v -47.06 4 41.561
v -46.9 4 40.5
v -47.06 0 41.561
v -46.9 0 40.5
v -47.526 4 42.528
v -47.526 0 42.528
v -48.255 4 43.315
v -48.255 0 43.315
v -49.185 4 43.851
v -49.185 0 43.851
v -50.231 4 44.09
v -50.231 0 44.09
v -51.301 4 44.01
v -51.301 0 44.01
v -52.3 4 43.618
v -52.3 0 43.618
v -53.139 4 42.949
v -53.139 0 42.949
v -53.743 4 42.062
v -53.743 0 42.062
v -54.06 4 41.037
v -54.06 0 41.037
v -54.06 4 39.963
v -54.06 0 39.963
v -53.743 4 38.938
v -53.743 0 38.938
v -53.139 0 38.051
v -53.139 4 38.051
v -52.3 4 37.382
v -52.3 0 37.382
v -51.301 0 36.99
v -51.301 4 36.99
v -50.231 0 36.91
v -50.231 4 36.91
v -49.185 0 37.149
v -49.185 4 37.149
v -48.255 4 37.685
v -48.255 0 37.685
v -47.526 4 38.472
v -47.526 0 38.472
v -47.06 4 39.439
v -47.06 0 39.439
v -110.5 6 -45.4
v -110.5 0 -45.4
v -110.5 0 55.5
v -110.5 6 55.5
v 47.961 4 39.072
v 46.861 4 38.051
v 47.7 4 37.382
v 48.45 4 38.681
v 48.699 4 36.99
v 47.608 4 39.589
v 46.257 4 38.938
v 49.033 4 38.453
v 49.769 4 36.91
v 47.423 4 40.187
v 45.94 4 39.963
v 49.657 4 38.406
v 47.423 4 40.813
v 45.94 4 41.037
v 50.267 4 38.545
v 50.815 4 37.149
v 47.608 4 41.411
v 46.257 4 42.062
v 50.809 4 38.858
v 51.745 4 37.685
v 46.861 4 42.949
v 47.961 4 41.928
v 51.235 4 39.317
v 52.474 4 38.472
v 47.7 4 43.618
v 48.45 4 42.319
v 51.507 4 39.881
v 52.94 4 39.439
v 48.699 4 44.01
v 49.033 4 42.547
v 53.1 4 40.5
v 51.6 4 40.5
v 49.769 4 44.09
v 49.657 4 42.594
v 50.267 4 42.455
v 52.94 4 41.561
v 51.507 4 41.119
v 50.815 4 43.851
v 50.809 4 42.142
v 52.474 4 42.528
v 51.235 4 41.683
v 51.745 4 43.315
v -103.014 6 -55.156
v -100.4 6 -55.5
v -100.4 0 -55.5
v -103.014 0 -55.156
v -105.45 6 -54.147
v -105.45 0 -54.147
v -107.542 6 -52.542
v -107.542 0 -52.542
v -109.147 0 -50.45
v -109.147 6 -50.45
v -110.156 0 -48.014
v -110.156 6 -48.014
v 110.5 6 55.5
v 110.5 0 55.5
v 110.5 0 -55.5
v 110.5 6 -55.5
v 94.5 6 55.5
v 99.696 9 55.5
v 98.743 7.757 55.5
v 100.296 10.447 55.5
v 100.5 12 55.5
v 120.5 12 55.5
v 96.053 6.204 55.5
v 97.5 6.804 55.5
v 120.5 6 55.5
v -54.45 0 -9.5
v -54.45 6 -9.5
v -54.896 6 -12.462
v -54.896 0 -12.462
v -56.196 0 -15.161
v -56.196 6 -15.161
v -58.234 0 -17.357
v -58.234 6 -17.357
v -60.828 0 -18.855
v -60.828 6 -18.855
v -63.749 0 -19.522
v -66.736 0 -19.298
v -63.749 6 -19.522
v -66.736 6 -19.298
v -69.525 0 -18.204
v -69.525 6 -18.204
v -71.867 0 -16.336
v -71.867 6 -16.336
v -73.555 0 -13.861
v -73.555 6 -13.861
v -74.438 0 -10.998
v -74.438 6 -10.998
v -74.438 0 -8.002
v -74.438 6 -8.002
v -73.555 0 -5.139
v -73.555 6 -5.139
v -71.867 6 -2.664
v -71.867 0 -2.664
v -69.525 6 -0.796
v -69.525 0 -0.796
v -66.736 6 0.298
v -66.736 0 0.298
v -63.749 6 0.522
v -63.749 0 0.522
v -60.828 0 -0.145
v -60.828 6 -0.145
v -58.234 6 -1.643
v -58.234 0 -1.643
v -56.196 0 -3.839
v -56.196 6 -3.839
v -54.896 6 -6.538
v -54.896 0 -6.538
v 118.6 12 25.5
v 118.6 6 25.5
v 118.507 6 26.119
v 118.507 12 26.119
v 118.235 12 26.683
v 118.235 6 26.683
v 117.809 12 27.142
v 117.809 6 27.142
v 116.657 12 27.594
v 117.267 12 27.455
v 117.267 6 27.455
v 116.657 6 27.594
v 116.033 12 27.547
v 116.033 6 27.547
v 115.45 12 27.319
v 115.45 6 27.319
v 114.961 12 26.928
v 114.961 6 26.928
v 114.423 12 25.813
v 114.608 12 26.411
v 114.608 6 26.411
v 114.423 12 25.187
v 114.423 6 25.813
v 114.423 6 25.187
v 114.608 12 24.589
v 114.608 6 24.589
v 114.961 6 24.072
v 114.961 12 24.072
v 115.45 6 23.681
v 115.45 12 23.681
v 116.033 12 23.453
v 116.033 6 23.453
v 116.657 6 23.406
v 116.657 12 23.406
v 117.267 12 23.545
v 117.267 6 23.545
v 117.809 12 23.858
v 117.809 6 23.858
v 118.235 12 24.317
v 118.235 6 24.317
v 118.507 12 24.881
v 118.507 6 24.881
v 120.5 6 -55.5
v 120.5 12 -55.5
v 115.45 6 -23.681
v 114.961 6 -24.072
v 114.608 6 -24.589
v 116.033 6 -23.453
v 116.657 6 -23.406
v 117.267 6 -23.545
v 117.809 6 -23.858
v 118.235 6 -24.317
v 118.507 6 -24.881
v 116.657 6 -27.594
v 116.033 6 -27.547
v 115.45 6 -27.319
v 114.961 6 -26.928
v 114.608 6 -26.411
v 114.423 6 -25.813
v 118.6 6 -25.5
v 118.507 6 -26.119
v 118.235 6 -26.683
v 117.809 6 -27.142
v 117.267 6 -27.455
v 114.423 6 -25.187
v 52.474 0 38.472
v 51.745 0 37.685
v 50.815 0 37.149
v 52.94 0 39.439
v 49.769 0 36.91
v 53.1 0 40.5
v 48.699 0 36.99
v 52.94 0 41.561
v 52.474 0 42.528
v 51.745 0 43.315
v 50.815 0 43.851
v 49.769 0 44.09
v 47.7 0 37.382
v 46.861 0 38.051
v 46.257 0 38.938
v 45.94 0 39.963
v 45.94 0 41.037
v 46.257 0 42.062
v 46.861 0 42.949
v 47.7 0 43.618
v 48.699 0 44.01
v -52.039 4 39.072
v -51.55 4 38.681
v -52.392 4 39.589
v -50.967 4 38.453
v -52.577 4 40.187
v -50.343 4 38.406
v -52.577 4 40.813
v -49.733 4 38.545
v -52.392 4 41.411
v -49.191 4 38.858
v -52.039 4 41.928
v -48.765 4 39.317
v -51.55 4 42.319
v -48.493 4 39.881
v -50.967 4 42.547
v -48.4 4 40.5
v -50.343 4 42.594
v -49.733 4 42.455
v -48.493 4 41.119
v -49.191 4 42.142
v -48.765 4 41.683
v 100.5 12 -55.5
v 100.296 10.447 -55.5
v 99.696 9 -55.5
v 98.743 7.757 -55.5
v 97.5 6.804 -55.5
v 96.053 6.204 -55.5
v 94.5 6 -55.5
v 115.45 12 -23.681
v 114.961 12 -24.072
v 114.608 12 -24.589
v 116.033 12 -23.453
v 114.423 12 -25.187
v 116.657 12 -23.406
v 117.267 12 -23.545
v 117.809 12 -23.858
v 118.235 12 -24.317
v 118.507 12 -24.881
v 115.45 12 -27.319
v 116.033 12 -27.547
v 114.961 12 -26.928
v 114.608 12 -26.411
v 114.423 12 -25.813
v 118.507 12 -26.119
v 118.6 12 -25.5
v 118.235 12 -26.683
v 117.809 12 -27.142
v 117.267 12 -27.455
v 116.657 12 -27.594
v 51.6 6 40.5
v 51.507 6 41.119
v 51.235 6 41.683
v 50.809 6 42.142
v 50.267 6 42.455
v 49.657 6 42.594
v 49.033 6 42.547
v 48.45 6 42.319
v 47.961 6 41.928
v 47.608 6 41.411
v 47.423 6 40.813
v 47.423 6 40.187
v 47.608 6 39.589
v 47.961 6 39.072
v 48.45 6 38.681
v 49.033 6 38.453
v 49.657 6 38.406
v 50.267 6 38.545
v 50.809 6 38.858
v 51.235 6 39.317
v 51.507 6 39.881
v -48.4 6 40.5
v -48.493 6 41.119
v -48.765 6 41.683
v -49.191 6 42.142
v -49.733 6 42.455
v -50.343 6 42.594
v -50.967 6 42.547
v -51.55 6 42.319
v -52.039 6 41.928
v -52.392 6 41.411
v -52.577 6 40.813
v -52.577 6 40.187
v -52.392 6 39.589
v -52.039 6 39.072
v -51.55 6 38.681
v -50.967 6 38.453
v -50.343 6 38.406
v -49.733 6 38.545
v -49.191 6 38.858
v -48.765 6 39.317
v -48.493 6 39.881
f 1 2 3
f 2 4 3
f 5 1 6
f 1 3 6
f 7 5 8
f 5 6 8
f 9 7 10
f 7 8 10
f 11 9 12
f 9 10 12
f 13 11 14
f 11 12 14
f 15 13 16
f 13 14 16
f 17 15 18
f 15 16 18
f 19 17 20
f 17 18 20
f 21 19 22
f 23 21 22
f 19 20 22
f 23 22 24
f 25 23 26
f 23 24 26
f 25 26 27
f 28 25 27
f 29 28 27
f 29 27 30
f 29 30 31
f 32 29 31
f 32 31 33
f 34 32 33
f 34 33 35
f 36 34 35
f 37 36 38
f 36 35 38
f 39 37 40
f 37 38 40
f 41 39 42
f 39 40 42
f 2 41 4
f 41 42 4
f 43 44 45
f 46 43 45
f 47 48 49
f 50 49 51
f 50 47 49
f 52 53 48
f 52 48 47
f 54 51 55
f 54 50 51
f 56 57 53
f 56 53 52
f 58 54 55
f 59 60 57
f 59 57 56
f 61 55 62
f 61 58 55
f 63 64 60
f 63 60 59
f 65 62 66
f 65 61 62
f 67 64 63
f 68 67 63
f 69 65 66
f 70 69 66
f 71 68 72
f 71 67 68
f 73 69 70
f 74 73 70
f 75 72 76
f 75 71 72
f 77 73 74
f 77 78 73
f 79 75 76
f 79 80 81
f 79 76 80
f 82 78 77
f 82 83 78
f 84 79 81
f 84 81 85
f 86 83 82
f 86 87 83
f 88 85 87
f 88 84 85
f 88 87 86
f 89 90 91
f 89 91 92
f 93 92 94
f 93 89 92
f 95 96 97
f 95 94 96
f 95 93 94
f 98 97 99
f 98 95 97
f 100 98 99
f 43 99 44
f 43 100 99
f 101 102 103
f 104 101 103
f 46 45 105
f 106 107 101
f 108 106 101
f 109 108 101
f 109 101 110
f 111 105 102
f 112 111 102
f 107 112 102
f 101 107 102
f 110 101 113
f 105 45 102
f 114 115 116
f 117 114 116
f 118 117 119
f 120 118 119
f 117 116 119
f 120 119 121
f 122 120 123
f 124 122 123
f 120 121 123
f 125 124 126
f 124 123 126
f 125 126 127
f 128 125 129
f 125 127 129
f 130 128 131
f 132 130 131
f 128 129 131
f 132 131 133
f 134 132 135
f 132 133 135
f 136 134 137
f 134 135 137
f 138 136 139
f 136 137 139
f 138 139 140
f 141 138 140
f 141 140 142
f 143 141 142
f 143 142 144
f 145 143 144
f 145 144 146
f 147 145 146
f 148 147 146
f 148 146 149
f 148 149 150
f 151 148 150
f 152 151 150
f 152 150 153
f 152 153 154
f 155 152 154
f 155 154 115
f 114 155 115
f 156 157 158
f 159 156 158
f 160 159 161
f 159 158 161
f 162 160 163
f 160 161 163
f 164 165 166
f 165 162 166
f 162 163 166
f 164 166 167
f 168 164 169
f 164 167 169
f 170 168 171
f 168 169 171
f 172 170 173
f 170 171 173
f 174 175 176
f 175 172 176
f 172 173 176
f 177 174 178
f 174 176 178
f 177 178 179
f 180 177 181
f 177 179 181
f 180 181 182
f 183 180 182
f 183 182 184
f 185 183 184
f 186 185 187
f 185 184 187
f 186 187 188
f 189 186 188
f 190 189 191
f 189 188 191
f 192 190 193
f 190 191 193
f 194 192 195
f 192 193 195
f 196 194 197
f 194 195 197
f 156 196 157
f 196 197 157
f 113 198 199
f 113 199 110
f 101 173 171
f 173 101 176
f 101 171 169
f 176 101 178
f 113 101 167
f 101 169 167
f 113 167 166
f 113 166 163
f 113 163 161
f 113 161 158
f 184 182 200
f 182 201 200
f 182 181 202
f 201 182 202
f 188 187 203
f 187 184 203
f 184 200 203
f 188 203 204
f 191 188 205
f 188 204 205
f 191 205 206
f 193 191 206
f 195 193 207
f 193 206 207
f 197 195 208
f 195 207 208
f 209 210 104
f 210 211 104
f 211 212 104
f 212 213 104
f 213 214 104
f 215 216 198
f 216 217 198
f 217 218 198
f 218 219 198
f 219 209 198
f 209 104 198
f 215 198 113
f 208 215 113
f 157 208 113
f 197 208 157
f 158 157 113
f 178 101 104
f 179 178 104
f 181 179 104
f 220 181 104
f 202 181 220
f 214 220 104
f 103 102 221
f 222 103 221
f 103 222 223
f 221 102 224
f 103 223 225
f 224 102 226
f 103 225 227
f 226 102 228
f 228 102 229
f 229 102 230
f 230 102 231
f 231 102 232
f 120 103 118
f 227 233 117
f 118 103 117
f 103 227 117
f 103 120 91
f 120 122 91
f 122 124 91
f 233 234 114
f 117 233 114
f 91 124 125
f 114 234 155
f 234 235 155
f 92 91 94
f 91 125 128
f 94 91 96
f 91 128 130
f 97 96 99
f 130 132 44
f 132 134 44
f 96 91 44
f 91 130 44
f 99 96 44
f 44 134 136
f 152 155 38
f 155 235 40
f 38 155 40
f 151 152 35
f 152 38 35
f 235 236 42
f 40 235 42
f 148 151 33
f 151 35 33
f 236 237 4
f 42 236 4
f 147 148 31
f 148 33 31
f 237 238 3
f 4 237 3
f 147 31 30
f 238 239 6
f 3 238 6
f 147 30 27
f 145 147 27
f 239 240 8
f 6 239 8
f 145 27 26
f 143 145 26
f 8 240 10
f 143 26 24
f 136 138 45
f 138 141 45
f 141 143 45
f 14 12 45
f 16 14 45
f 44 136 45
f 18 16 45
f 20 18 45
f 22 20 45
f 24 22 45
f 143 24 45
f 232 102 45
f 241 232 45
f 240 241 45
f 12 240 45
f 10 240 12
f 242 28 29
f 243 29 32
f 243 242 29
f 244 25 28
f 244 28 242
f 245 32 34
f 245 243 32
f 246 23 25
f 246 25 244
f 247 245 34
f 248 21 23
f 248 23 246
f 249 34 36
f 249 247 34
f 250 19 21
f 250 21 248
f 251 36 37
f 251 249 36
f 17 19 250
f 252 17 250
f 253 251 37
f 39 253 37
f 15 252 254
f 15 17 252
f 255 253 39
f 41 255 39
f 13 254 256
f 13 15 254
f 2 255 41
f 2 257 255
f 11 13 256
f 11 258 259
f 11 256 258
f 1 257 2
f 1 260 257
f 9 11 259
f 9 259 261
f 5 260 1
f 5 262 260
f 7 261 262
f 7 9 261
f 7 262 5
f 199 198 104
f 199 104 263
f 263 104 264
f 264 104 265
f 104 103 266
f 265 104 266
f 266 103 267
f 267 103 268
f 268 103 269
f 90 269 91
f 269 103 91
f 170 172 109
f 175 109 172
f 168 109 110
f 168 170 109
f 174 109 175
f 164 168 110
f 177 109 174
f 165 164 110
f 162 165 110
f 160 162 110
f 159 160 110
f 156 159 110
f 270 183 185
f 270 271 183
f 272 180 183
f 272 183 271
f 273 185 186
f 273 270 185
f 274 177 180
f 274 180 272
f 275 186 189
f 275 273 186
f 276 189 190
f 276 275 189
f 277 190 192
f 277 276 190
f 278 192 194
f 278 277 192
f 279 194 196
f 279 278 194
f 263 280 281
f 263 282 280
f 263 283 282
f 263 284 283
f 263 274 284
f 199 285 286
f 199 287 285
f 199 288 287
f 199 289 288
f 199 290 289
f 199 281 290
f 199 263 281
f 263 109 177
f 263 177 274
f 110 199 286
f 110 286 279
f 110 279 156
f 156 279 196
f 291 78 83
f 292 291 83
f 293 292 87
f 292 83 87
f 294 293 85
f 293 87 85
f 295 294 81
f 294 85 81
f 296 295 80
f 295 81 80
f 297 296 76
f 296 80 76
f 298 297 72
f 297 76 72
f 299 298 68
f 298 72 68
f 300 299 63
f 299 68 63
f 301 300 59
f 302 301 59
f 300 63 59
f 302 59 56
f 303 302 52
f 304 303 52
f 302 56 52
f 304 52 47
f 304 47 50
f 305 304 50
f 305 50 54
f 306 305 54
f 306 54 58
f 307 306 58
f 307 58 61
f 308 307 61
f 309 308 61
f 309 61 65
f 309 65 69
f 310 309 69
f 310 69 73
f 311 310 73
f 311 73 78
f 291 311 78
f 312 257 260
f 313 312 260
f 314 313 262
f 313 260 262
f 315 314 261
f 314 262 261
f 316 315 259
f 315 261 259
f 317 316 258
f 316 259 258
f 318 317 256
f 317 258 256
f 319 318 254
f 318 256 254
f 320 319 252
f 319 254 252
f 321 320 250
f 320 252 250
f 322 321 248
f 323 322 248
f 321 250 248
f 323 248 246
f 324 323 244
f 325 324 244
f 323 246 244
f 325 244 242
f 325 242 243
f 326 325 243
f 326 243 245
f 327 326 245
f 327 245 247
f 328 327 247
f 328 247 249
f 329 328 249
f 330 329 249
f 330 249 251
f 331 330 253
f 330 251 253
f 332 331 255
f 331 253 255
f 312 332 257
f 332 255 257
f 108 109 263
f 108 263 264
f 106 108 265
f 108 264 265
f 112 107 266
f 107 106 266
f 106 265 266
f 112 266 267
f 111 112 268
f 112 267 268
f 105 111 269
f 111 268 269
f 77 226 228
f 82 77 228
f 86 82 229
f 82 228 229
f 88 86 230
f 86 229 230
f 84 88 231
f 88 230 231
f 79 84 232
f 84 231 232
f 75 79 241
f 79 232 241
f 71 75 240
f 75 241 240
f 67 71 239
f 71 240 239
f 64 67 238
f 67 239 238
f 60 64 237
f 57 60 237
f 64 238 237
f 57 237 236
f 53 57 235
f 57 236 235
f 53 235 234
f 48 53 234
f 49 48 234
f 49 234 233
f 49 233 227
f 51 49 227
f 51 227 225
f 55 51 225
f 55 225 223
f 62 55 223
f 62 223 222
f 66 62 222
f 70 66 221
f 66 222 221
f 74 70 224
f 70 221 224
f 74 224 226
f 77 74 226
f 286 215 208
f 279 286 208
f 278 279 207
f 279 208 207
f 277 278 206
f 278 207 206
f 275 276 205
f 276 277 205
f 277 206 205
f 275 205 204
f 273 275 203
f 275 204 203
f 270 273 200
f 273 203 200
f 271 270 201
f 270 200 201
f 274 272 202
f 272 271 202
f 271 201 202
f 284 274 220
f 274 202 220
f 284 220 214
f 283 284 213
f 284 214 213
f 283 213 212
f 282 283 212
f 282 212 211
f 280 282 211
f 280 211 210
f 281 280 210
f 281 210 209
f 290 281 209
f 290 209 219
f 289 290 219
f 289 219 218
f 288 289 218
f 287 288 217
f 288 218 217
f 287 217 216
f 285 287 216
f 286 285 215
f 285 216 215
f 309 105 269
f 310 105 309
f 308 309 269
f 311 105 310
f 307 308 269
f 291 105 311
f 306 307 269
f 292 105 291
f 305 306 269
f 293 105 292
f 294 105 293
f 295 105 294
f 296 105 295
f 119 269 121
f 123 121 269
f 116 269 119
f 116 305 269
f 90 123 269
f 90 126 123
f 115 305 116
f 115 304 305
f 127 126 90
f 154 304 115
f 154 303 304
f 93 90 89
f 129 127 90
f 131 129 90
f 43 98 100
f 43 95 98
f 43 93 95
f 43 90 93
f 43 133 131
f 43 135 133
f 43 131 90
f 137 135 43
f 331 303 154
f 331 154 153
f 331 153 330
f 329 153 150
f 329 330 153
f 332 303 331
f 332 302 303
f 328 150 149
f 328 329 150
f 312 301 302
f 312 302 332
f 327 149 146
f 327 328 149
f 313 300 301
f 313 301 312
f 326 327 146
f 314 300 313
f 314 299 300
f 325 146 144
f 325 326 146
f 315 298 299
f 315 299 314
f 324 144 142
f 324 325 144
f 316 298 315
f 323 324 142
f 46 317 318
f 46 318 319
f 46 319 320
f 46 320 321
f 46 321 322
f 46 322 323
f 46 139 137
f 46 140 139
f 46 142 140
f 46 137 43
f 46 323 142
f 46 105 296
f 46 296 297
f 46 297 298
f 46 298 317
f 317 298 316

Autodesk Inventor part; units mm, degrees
ref_plane "YZ Plane" through (0, 0, 0) normal (1, 0, 0) x (0, 1, 0)
ref_plane "XZ Plane" through (0, 0, 0) normal (0, 1, 0) x (-1, 0, 0)
ref_plane "XY Plane" through (0, 0, 0) normal (0, 0, 1) x (1, 0, 0)
sketch "草图1" plane through (0, 0, 0) normal (0, 1, 0) x (-1, 0, 0)
  line L0 (110.5, 55.5) -> (-110.5, 55.5)
  line L1 (-110.5, 55.5) -> (-110.5, -55.5)
  line L2 (-110.5, -55.5) -> (110.5, -55.5)
  line L3 (110.5, -55.5) -> (110.5, 55.5)
  line L4 (0, 7.5575) -> (0, -11)
  line L5 (8.5019, 0) -> (-7, 0)
  point P0 (0, 0)
  point P1 (0, 0)
  point P2 (0, 0)
  dimension "d0" = 221
  dimension "d1" = 111
extrude "拉伸1" add sketch "草图1" along normal blind 6
fillet "圆角1" radius 10.1 1 edges at (-110.5, 3, -55.5)
sketch "草图2" plane through (0, 6, 0) normal (0, 1, 0) x (1, 0, 0)
  circle A0 centre (-64.5, 9.5) radius 10.05
  line L0 (110.5, 55.5) -> (-100.4, 55.5) projected
  line L1 (-110.5, 45.4) -> (-110.5, -55.5) projected
  point P0 (0, 0)
  dimension "d5" = 20.1
  dimension "d6" = 46
  dimension "d7" = 46
extrude "拉伸2" cut sketch "草图2" against normal blind 6
sketch "草图3" plane through (0, 6, 0) normal (0, 1, 0) x (1, 0, 0)
  line L0 (100.5, 55.5) -> (120.5, 55.5)
  line L1 (120.5, 55.5) -> (120.5, -55.5)
  line L2 (120.5, -55.5) -> (100.5, -55.5)
  line L3 (100.5, -55.5) -> (100.5, 55.5)
  line L4 (110.5, -55.5) -> (110.5, 55.5)
  circle A0 centre (116.5, 25.5) radius 2.1
  circle A1 centre (116.5, -25.5) radius 2.1
  point P0 (0, 0)
  dimension "d10" = 20
  dimension "d11" = 10
  dimension "d12" = 4.2
  dimension "d13" = 4.2
  dimension "d14" = 4
  dimension "d15" = 4
  dimension "d16" = 30
  dimension "d17" = 30
extrude "拉伸3" add sketch "草图3" along normal blind 6
fillet "圆角2" radius 6 1 edges at (100.5, 6, 0)
sketch "草图4" plane through (0, 0, 0) normal (0, -1, 0) x (1, 0, 0)
  circle A0 centre (-50.5, 40.5) radius 2.1
  circle A1 centre (49.5, 40.5) radius 2.1
  line L0 (-110.5, 55.5) -> (110.5, 55.5) projected
  line L1 (-110.5, -45.4) -> (-110.5, 55.5) projected
  point P0 (0, 0)
  dimension "d21" = 4.2
  dimension "d22" = 4.2
  dimension "d23" = 15
  dimension "d24" = 15
  dimension "d25" = 60
  dimension "d26" = 100
extrude "拉伸4" cut sketch "草图4" against normal blind 6
sketch "草图5" plane through (0, 0, 0) normal (0, -1, 0) x (1, 0, 0)
  circle A0 centre (-50.5, 40.5) radius 2.1 projected
  circle A1 centre (-50.5, 40.5) radius 3.6
  circle A2 centre (49.5, 40.5) radius 2.1 projected
  circle A3 centre (49.5, 40.5) radius 3.6
  point P0 (0, 0)
  dimension "d29" = 7.2
  dimension "d30" = 7.2
extrude "拉伸5" cut sketch "草图5" against normal blind 4 contours A0 | A1 | A2 | A3
properties part number "底板_C"
